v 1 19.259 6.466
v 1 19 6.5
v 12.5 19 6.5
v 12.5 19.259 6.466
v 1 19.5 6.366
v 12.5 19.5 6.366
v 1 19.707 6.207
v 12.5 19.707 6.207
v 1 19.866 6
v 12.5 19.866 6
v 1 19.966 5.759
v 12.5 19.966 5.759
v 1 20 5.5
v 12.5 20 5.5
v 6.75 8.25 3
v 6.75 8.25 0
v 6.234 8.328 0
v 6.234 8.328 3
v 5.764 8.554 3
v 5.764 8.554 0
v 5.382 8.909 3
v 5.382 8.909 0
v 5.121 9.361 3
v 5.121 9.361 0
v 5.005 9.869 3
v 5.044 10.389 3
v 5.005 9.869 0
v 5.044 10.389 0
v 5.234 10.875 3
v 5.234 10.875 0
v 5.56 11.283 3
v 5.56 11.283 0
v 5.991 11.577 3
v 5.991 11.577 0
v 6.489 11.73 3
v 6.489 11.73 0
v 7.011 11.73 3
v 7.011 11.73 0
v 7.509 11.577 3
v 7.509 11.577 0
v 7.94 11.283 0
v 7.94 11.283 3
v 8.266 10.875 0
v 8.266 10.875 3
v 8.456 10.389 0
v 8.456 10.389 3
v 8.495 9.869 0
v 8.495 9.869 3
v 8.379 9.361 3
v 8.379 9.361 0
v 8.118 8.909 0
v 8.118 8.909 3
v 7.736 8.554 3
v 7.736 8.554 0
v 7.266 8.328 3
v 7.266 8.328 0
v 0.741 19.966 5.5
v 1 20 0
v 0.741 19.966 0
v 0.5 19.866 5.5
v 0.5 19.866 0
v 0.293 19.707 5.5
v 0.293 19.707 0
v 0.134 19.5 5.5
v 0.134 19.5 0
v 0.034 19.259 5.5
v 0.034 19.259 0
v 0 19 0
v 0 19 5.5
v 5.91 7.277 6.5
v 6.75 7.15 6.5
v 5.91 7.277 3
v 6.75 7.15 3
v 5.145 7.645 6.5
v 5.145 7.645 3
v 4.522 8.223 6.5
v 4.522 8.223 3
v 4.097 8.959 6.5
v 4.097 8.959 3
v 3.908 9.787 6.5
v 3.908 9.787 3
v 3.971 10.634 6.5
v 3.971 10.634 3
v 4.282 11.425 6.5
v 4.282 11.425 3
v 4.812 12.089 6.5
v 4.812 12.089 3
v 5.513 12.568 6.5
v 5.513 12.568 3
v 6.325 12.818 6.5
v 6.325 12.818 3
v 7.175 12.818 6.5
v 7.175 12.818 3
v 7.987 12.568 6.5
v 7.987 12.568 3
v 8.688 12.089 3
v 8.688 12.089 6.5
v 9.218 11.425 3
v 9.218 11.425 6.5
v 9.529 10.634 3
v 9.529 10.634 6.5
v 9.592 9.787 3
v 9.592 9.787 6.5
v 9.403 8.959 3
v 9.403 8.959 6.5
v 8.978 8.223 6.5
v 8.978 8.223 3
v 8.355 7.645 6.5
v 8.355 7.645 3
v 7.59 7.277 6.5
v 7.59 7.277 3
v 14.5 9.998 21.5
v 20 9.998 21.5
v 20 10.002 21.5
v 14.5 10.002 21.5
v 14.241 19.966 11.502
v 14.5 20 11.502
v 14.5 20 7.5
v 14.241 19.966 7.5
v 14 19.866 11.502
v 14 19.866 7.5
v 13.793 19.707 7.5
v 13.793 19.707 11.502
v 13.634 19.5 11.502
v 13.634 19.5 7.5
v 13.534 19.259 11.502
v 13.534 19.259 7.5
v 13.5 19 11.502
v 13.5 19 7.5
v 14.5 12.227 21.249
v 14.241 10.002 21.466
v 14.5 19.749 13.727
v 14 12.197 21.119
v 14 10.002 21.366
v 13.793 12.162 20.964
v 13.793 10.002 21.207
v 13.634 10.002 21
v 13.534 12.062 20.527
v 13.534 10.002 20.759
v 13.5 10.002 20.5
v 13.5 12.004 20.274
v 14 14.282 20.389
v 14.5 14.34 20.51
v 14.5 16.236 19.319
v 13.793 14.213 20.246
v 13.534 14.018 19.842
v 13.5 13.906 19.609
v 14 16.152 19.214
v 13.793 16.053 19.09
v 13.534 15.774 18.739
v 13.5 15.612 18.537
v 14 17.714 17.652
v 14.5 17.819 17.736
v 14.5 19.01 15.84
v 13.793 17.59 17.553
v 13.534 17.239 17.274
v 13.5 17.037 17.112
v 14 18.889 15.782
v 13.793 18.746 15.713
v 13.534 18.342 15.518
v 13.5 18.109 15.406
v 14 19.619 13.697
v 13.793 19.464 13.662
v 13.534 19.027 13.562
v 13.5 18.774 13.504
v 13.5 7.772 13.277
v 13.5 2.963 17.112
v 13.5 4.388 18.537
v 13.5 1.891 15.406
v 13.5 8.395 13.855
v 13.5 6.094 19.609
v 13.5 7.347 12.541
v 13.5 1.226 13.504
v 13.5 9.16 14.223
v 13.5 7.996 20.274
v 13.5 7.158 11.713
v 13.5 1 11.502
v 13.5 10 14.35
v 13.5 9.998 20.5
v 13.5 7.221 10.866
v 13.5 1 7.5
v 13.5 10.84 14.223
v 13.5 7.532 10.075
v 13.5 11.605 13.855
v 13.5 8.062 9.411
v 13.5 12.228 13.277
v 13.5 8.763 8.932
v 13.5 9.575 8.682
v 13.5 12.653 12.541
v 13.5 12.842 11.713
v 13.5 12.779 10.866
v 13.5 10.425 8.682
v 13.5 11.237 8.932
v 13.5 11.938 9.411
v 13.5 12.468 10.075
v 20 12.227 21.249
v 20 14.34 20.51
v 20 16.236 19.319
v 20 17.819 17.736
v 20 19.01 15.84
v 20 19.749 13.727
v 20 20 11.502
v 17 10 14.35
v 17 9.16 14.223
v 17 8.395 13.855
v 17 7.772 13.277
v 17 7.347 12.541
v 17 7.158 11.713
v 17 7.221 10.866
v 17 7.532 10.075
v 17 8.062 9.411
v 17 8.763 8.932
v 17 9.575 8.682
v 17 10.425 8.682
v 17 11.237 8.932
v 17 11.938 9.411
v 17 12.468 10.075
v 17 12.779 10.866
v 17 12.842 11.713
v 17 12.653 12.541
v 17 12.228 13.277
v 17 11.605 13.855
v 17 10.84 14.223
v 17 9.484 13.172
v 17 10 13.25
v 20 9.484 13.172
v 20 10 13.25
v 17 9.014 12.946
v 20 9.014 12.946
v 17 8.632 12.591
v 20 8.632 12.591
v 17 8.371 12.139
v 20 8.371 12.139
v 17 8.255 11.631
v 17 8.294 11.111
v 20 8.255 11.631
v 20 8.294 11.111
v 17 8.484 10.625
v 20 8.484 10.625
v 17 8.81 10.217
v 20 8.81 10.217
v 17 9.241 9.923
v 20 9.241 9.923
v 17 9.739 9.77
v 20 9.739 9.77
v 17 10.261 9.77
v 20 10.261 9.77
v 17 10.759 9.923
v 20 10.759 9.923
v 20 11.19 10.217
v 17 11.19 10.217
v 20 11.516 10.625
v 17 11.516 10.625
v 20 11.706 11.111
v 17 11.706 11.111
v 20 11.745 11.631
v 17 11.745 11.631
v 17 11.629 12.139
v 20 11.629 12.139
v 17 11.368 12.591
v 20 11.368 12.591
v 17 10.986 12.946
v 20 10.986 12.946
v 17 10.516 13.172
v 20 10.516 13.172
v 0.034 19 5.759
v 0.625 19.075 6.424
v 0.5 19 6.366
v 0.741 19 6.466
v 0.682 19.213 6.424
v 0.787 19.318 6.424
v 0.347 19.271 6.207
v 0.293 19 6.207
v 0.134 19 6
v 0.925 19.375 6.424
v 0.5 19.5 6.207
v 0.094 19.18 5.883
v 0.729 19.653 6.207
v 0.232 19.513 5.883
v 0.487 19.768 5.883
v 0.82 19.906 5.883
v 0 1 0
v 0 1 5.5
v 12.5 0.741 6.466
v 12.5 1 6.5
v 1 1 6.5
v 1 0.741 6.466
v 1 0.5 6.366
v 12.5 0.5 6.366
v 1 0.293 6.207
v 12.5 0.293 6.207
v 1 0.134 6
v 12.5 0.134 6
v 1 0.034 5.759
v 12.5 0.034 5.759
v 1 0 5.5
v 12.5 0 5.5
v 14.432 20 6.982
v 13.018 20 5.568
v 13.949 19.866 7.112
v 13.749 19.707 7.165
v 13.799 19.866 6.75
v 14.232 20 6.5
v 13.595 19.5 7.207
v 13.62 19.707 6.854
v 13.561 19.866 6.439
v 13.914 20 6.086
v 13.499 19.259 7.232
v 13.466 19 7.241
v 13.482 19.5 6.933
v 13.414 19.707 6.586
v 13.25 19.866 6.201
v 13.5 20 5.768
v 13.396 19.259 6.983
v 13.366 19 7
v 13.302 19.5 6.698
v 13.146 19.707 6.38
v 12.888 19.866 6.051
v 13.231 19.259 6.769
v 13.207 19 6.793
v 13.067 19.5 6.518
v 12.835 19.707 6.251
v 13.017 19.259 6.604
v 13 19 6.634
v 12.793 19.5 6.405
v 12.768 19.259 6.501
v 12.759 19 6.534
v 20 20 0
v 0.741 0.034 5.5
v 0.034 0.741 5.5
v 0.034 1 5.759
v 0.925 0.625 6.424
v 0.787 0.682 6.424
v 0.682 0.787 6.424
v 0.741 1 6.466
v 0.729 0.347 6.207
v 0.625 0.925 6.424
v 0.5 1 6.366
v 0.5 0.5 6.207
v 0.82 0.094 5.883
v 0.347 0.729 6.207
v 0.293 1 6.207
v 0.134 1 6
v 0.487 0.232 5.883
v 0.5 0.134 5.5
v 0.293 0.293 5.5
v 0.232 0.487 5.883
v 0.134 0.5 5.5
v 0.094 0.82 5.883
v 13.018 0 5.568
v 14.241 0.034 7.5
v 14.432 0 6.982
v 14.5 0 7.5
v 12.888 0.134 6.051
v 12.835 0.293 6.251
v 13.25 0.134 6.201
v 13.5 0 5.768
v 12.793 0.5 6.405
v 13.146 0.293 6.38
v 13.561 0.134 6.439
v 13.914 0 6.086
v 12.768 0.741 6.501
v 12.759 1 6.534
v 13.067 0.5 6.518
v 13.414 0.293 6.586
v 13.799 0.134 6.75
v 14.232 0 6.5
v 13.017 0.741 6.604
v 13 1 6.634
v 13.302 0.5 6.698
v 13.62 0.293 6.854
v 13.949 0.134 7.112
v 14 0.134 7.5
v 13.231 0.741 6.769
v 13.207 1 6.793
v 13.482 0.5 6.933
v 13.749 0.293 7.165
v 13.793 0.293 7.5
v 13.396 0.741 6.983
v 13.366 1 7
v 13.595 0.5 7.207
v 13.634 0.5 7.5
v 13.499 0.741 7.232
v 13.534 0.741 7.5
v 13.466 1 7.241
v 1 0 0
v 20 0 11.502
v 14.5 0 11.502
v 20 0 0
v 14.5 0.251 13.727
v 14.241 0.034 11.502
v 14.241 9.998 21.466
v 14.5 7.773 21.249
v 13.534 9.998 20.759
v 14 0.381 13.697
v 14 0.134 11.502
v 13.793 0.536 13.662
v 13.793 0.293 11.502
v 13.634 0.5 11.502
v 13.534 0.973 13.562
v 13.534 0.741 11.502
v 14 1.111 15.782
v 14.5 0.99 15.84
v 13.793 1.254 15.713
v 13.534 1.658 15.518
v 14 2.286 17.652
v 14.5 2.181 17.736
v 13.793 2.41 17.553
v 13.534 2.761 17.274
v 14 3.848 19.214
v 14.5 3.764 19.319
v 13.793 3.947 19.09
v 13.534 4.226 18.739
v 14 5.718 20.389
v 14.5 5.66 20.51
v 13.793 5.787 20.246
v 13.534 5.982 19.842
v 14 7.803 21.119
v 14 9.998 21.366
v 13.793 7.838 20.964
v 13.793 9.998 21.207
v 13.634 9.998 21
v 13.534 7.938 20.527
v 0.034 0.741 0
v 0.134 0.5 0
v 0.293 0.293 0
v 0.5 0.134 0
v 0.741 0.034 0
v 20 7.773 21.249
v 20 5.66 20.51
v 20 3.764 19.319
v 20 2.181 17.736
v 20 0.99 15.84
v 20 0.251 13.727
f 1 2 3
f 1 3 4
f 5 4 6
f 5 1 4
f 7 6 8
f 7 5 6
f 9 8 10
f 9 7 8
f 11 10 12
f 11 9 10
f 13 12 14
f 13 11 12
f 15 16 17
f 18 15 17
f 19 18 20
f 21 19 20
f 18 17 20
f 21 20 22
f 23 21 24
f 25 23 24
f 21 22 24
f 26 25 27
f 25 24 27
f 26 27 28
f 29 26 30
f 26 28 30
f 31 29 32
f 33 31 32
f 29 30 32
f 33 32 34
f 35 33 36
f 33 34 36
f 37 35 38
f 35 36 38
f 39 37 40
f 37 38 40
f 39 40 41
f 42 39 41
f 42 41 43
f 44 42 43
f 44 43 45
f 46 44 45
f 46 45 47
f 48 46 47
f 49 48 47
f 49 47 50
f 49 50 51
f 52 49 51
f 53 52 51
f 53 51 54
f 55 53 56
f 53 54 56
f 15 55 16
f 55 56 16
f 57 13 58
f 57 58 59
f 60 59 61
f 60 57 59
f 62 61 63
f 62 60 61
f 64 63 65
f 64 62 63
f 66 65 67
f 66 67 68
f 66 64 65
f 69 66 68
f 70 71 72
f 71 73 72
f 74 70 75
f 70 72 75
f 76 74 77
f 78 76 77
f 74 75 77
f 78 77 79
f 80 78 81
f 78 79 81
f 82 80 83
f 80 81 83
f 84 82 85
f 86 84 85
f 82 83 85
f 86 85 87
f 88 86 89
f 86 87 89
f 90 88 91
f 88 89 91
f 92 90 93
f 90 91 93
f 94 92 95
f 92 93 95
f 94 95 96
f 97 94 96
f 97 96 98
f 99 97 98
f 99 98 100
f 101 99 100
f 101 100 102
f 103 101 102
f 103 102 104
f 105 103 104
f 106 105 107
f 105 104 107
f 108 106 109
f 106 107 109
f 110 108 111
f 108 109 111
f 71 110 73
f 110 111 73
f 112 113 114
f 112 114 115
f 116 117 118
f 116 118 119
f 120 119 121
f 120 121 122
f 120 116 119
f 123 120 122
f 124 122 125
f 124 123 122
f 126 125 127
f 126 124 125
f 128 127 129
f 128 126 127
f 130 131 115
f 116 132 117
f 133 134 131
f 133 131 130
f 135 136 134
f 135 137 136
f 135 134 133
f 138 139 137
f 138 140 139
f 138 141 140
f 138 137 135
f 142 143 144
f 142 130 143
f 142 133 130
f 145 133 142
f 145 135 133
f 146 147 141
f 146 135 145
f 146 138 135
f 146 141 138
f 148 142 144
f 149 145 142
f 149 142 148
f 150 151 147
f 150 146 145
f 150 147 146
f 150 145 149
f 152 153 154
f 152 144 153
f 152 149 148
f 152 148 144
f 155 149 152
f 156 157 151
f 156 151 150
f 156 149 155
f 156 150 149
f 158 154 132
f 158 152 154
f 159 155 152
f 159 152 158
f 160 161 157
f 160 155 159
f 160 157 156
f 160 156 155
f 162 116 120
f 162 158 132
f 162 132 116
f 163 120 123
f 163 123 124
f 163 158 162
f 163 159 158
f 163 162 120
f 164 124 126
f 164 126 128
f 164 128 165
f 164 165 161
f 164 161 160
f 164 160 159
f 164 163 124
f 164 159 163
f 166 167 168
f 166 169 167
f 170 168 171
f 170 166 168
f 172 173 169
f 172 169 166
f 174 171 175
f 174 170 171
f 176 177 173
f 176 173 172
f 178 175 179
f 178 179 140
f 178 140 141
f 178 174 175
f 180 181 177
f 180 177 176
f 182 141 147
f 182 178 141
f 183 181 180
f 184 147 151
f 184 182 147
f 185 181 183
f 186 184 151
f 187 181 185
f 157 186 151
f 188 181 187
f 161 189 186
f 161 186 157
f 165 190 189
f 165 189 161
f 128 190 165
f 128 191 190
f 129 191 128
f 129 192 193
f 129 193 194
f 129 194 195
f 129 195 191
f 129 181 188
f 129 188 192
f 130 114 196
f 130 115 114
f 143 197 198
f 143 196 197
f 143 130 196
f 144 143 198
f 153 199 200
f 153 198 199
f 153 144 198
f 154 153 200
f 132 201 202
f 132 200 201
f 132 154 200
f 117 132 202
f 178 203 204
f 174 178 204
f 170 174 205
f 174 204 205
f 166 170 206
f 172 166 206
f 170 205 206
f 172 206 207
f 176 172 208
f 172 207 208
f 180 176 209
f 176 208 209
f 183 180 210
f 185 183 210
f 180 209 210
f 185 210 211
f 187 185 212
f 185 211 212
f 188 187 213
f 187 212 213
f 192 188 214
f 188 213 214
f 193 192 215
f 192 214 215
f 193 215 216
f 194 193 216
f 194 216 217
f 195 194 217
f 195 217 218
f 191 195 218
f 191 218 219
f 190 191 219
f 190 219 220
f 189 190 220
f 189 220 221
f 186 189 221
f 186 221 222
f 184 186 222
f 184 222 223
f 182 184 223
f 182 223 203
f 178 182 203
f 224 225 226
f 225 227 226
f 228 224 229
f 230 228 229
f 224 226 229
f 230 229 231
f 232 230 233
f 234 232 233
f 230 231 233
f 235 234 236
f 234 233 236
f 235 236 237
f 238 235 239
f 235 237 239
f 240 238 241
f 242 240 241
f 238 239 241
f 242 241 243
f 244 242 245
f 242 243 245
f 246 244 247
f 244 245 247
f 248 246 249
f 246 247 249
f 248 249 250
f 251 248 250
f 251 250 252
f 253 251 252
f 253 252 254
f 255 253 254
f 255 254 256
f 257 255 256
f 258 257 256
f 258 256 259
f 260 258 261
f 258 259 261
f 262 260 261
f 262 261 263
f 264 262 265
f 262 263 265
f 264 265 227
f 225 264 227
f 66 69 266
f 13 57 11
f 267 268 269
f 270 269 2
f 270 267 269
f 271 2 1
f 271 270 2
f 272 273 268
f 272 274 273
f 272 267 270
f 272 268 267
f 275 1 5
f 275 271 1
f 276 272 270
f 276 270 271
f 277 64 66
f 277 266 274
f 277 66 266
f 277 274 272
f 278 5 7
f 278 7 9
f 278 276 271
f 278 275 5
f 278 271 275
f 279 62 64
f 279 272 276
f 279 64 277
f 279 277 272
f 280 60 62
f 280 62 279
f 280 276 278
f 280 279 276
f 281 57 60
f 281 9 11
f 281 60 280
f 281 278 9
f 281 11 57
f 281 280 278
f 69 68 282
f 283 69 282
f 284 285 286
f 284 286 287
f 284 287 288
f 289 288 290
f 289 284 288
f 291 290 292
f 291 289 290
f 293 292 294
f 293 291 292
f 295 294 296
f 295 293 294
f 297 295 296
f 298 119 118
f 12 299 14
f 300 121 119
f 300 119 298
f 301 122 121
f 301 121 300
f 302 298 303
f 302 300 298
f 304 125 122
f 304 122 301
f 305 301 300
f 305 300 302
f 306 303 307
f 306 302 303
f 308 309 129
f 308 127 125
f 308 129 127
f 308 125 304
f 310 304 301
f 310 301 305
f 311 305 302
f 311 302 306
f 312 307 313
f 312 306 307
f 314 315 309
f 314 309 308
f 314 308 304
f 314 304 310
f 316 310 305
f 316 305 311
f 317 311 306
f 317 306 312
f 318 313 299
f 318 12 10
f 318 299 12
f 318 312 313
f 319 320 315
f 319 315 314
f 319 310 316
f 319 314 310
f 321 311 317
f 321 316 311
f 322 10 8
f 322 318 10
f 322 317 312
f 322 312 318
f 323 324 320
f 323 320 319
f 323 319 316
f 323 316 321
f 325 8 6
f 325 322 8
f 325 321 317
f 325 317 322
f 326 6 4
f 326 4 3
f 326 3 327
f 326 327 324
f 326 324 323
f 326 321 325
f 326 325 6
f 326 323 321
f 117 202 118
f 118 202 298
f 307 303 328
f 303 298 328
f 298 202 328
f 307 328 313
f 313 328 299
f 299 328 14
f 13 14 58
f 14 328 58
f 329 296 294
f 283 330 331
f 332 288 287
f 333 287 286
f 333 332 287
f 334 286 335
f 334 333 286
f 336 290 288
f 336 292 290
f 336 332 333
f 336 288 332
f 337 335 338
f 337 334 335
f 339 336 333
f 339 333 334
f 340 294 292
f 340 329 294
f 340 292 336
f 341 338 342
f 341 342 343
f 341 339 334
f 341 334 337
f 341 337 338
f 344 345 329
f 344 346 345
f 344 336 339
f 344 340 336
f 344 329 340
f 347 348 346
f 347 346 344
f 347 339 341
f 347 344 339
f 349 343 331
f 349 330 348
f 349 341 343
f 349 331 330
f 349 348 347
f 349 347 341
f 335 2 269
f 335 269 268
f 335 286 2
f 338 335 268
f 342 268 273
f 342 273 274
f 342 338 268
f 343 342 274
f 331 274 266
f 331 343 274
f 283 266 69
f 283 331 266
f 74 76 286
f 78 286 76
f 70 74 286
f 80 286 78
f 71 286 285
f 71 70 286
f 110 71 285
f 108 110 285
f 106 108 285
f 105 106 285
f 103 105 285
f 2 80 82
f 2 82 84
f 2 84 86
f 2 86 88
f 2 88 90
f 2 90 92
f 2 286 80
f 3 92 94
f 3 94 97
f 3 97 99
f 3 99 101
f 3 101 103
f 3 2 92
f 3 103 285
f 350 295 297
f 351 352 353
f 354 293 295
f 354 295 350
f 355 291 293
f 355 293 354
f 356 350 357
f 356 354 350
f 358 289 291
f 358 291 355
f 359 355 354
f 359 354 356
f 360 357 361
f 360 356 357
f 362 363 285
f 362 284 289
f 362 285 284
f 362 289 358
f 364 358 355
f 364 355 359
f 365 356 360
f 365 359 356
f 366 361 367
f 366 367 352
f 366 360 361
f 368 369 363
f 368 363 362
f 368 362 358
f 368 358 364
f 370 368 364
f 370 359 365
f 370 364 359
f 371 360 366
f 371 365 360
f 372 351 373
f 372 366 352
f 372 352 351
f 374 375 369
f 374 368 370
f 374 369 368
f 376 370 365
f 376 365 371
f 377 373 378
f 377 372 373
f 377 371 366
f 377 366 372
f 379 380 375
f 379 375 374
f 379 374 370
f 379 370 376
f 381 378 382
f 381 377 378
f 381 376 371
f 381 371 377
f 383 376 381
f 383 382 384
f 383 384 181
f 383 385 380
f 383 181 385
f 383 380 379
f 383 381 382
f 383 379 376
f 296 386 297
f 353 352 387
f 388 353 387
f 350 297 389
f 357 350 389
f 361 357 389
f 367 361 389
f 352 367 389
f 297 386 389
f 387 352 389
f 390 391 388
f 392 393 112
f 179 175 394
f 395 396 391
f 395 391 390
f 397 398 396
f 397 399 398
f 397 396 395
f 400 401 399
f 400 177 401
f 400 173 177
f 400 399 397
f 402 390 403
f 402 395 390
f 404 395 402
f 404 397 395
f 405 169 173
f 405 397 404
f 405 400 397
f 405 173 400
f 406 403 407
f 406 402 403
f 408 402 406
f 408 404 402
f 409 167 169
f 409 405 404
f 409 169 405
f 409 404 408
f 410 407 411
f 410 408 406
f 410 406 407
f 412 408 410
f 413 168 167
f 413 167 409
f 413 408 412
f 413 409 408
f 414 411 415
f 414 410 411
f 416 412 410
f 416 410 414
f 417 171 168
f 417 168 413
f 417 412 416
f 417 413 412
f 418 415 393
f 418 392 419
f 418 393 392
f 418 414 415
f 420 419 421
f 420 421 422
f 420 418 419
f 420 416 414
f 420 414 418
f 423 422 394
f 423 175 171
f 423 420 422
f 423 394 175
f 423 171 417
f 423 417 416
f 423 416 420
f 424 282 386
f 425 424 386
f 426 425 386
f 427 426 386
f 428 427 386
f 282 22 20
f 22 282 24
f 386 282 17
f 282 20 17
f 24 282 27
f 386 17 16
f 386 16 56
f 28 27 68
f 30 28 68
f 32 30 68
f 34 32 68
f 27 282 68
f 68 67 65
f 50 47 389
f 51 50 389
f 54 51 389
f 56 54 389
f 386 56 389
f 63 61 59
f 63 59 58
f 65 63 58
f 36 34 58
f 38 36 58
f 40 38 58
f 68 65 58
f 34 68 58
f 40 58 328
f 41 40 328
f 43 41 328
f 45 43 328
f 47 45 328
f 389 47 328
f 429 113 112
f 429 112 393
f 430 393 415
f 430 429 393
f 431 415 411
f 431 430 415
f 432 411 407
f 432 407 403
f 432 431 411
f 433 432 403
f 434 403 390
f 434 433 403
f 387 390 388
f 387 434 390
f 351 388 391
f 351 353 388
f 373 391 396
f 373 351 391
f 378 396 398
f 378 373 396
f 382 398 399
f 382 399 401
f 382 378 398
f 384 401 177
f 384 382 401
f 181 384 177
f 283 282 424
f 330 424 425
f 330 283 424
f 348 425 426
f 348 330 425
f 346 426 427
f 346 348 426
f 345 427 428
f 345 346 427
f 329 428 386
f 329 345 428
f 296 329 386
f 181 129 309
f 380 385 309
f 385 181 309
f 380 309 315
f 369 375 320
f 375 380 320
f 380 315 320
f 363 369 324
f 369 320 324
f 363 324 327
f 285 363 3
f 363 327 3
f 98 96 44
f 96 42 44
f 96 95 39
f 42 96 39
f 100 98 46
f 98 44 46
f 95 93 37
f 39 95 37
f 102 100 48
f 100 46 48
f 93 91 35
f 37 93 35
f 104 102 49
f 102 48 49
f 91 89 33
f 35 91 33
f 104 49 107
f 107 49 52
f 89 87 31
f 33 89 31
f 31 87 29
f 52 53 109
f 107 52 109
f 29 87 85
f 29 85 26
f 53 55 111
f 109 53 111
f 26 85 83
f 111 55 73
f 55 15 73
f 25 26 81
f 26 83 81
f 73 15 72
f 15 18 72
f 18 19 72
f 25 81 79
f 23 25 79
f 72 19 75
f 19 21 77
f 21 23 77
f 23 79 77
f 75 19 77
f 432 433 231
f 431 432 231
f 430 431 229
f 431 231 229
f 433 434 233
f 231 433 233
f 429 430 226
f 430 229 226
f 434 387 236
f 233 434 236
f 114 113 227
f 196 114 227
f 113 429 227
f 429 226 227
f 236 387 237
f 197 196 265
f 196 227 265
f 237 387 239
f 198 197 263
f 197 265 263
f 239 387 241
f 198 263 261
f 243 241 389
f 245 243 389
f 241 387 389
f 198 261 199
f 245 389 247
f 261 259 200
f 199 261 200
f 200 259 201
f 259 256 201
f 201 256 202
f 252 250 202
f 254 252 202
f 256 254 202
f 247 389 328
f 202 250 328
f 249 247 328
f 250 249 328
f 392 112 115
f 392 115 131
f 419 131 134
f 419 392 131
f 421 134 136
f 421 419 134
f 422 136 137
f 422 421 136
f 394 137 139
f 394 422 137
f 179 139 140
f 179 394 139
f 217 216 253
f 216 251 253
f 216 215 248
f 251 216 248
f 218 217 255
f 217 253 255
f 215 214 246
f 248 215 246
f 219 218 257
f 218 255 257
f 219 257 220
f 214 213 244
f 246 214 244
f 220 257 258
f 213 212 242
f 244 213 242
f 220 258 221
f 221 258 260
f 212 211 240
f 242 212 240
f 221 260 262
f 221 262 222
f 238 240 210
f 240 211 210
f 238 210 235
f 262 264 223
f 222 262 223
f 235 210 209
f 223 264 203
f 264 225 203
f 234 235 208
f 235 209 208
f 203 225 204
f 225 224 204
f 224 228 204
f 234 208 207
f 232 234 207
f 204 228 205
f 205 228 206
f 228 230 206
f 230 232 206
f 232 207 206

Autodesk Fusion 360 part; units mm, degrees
sketch "Sketch1" plane through (0, 0, 0) normal (0, 0, 1) x (1, 0, 0)
  line L0 (0, 0) -> (20, 0)
  line L1 (20, 0) -> (20, 20)
  line L2 (20, 20) -> (0, 20)
  line L3 (0, 20) -> (0, 0)
  dimension "d34" = 20
extrude "Extrude1" add sketch "Sketch1" along normal blind 6.5
sketch "Sketch2" plane through (0, 0, 6.5) normal (0, 0, 1) x (-1, 0, 0)
  line L0 (0, -20) -> (0, 0)
  line L1 (0, 0) -> (-20, 0)
  line L2 (-20, 0) -> (-20, -20)
  line L3 (-20, -20) -> (0, -20)
  line L4 (-20, -20) -> (-20, 0)
  line L5 (-13.5, 0) -> (-13.5, -20)
  line L6 (-13.5, -20) -> (0, 0) construction
  dimension "d33" = 6.5
extrude "Extrude2" add sketch "Sketch2" along normal blind 15 contours L1 L2 L3 L4 L5
sketch "Sketch5" plane through (20, 0, 0) normal (1, 0, 0) x (0, 1, 0)
  line L0 (0, 21.5) -> (0, 0)
  line L1 (0, 0) -> (20, 0)
  line L2 (20, 0) -> (20, 21.5)
  line L3 (20, 21.5) -> (0, 21.5)
  line L4 (0, 21.5) -> (20, 1.5) construction
  line L5 (0, 21.5) -> (20, 21.5) construction
  line L6 (20, 21.5) -> (10, 11.5) construction
  dimension "d37" = 45
fillet "Fillet2" radius 10 2 edges at (16.75, 20, 21.5) (16.75, 0, 21.5)
hole "Hole3" at (13.5, 10, 11.5) direction (1, 0, 0) diameter 3.5 end through all counterbore diameter 5.7 counterbore depth 3.5
hole "Hole4" at (6.75, 10, 6.5) direction (0, 0, -1) diameter 3.5 end through all counterbore diameter 5.7 counterbore depth 3.5
fillet "Fillet1" radius 1 9 edges at (0, 20, 3.25) (0, 0, 3.25) (6.75, 0, 6.5) (6.75, 20, 6.5) (0, 10, 6.5) (13.5, 20, 9) (13.5, 10, 21.5) (13.5, 0, 9) (13.5, 10, 6.5)
